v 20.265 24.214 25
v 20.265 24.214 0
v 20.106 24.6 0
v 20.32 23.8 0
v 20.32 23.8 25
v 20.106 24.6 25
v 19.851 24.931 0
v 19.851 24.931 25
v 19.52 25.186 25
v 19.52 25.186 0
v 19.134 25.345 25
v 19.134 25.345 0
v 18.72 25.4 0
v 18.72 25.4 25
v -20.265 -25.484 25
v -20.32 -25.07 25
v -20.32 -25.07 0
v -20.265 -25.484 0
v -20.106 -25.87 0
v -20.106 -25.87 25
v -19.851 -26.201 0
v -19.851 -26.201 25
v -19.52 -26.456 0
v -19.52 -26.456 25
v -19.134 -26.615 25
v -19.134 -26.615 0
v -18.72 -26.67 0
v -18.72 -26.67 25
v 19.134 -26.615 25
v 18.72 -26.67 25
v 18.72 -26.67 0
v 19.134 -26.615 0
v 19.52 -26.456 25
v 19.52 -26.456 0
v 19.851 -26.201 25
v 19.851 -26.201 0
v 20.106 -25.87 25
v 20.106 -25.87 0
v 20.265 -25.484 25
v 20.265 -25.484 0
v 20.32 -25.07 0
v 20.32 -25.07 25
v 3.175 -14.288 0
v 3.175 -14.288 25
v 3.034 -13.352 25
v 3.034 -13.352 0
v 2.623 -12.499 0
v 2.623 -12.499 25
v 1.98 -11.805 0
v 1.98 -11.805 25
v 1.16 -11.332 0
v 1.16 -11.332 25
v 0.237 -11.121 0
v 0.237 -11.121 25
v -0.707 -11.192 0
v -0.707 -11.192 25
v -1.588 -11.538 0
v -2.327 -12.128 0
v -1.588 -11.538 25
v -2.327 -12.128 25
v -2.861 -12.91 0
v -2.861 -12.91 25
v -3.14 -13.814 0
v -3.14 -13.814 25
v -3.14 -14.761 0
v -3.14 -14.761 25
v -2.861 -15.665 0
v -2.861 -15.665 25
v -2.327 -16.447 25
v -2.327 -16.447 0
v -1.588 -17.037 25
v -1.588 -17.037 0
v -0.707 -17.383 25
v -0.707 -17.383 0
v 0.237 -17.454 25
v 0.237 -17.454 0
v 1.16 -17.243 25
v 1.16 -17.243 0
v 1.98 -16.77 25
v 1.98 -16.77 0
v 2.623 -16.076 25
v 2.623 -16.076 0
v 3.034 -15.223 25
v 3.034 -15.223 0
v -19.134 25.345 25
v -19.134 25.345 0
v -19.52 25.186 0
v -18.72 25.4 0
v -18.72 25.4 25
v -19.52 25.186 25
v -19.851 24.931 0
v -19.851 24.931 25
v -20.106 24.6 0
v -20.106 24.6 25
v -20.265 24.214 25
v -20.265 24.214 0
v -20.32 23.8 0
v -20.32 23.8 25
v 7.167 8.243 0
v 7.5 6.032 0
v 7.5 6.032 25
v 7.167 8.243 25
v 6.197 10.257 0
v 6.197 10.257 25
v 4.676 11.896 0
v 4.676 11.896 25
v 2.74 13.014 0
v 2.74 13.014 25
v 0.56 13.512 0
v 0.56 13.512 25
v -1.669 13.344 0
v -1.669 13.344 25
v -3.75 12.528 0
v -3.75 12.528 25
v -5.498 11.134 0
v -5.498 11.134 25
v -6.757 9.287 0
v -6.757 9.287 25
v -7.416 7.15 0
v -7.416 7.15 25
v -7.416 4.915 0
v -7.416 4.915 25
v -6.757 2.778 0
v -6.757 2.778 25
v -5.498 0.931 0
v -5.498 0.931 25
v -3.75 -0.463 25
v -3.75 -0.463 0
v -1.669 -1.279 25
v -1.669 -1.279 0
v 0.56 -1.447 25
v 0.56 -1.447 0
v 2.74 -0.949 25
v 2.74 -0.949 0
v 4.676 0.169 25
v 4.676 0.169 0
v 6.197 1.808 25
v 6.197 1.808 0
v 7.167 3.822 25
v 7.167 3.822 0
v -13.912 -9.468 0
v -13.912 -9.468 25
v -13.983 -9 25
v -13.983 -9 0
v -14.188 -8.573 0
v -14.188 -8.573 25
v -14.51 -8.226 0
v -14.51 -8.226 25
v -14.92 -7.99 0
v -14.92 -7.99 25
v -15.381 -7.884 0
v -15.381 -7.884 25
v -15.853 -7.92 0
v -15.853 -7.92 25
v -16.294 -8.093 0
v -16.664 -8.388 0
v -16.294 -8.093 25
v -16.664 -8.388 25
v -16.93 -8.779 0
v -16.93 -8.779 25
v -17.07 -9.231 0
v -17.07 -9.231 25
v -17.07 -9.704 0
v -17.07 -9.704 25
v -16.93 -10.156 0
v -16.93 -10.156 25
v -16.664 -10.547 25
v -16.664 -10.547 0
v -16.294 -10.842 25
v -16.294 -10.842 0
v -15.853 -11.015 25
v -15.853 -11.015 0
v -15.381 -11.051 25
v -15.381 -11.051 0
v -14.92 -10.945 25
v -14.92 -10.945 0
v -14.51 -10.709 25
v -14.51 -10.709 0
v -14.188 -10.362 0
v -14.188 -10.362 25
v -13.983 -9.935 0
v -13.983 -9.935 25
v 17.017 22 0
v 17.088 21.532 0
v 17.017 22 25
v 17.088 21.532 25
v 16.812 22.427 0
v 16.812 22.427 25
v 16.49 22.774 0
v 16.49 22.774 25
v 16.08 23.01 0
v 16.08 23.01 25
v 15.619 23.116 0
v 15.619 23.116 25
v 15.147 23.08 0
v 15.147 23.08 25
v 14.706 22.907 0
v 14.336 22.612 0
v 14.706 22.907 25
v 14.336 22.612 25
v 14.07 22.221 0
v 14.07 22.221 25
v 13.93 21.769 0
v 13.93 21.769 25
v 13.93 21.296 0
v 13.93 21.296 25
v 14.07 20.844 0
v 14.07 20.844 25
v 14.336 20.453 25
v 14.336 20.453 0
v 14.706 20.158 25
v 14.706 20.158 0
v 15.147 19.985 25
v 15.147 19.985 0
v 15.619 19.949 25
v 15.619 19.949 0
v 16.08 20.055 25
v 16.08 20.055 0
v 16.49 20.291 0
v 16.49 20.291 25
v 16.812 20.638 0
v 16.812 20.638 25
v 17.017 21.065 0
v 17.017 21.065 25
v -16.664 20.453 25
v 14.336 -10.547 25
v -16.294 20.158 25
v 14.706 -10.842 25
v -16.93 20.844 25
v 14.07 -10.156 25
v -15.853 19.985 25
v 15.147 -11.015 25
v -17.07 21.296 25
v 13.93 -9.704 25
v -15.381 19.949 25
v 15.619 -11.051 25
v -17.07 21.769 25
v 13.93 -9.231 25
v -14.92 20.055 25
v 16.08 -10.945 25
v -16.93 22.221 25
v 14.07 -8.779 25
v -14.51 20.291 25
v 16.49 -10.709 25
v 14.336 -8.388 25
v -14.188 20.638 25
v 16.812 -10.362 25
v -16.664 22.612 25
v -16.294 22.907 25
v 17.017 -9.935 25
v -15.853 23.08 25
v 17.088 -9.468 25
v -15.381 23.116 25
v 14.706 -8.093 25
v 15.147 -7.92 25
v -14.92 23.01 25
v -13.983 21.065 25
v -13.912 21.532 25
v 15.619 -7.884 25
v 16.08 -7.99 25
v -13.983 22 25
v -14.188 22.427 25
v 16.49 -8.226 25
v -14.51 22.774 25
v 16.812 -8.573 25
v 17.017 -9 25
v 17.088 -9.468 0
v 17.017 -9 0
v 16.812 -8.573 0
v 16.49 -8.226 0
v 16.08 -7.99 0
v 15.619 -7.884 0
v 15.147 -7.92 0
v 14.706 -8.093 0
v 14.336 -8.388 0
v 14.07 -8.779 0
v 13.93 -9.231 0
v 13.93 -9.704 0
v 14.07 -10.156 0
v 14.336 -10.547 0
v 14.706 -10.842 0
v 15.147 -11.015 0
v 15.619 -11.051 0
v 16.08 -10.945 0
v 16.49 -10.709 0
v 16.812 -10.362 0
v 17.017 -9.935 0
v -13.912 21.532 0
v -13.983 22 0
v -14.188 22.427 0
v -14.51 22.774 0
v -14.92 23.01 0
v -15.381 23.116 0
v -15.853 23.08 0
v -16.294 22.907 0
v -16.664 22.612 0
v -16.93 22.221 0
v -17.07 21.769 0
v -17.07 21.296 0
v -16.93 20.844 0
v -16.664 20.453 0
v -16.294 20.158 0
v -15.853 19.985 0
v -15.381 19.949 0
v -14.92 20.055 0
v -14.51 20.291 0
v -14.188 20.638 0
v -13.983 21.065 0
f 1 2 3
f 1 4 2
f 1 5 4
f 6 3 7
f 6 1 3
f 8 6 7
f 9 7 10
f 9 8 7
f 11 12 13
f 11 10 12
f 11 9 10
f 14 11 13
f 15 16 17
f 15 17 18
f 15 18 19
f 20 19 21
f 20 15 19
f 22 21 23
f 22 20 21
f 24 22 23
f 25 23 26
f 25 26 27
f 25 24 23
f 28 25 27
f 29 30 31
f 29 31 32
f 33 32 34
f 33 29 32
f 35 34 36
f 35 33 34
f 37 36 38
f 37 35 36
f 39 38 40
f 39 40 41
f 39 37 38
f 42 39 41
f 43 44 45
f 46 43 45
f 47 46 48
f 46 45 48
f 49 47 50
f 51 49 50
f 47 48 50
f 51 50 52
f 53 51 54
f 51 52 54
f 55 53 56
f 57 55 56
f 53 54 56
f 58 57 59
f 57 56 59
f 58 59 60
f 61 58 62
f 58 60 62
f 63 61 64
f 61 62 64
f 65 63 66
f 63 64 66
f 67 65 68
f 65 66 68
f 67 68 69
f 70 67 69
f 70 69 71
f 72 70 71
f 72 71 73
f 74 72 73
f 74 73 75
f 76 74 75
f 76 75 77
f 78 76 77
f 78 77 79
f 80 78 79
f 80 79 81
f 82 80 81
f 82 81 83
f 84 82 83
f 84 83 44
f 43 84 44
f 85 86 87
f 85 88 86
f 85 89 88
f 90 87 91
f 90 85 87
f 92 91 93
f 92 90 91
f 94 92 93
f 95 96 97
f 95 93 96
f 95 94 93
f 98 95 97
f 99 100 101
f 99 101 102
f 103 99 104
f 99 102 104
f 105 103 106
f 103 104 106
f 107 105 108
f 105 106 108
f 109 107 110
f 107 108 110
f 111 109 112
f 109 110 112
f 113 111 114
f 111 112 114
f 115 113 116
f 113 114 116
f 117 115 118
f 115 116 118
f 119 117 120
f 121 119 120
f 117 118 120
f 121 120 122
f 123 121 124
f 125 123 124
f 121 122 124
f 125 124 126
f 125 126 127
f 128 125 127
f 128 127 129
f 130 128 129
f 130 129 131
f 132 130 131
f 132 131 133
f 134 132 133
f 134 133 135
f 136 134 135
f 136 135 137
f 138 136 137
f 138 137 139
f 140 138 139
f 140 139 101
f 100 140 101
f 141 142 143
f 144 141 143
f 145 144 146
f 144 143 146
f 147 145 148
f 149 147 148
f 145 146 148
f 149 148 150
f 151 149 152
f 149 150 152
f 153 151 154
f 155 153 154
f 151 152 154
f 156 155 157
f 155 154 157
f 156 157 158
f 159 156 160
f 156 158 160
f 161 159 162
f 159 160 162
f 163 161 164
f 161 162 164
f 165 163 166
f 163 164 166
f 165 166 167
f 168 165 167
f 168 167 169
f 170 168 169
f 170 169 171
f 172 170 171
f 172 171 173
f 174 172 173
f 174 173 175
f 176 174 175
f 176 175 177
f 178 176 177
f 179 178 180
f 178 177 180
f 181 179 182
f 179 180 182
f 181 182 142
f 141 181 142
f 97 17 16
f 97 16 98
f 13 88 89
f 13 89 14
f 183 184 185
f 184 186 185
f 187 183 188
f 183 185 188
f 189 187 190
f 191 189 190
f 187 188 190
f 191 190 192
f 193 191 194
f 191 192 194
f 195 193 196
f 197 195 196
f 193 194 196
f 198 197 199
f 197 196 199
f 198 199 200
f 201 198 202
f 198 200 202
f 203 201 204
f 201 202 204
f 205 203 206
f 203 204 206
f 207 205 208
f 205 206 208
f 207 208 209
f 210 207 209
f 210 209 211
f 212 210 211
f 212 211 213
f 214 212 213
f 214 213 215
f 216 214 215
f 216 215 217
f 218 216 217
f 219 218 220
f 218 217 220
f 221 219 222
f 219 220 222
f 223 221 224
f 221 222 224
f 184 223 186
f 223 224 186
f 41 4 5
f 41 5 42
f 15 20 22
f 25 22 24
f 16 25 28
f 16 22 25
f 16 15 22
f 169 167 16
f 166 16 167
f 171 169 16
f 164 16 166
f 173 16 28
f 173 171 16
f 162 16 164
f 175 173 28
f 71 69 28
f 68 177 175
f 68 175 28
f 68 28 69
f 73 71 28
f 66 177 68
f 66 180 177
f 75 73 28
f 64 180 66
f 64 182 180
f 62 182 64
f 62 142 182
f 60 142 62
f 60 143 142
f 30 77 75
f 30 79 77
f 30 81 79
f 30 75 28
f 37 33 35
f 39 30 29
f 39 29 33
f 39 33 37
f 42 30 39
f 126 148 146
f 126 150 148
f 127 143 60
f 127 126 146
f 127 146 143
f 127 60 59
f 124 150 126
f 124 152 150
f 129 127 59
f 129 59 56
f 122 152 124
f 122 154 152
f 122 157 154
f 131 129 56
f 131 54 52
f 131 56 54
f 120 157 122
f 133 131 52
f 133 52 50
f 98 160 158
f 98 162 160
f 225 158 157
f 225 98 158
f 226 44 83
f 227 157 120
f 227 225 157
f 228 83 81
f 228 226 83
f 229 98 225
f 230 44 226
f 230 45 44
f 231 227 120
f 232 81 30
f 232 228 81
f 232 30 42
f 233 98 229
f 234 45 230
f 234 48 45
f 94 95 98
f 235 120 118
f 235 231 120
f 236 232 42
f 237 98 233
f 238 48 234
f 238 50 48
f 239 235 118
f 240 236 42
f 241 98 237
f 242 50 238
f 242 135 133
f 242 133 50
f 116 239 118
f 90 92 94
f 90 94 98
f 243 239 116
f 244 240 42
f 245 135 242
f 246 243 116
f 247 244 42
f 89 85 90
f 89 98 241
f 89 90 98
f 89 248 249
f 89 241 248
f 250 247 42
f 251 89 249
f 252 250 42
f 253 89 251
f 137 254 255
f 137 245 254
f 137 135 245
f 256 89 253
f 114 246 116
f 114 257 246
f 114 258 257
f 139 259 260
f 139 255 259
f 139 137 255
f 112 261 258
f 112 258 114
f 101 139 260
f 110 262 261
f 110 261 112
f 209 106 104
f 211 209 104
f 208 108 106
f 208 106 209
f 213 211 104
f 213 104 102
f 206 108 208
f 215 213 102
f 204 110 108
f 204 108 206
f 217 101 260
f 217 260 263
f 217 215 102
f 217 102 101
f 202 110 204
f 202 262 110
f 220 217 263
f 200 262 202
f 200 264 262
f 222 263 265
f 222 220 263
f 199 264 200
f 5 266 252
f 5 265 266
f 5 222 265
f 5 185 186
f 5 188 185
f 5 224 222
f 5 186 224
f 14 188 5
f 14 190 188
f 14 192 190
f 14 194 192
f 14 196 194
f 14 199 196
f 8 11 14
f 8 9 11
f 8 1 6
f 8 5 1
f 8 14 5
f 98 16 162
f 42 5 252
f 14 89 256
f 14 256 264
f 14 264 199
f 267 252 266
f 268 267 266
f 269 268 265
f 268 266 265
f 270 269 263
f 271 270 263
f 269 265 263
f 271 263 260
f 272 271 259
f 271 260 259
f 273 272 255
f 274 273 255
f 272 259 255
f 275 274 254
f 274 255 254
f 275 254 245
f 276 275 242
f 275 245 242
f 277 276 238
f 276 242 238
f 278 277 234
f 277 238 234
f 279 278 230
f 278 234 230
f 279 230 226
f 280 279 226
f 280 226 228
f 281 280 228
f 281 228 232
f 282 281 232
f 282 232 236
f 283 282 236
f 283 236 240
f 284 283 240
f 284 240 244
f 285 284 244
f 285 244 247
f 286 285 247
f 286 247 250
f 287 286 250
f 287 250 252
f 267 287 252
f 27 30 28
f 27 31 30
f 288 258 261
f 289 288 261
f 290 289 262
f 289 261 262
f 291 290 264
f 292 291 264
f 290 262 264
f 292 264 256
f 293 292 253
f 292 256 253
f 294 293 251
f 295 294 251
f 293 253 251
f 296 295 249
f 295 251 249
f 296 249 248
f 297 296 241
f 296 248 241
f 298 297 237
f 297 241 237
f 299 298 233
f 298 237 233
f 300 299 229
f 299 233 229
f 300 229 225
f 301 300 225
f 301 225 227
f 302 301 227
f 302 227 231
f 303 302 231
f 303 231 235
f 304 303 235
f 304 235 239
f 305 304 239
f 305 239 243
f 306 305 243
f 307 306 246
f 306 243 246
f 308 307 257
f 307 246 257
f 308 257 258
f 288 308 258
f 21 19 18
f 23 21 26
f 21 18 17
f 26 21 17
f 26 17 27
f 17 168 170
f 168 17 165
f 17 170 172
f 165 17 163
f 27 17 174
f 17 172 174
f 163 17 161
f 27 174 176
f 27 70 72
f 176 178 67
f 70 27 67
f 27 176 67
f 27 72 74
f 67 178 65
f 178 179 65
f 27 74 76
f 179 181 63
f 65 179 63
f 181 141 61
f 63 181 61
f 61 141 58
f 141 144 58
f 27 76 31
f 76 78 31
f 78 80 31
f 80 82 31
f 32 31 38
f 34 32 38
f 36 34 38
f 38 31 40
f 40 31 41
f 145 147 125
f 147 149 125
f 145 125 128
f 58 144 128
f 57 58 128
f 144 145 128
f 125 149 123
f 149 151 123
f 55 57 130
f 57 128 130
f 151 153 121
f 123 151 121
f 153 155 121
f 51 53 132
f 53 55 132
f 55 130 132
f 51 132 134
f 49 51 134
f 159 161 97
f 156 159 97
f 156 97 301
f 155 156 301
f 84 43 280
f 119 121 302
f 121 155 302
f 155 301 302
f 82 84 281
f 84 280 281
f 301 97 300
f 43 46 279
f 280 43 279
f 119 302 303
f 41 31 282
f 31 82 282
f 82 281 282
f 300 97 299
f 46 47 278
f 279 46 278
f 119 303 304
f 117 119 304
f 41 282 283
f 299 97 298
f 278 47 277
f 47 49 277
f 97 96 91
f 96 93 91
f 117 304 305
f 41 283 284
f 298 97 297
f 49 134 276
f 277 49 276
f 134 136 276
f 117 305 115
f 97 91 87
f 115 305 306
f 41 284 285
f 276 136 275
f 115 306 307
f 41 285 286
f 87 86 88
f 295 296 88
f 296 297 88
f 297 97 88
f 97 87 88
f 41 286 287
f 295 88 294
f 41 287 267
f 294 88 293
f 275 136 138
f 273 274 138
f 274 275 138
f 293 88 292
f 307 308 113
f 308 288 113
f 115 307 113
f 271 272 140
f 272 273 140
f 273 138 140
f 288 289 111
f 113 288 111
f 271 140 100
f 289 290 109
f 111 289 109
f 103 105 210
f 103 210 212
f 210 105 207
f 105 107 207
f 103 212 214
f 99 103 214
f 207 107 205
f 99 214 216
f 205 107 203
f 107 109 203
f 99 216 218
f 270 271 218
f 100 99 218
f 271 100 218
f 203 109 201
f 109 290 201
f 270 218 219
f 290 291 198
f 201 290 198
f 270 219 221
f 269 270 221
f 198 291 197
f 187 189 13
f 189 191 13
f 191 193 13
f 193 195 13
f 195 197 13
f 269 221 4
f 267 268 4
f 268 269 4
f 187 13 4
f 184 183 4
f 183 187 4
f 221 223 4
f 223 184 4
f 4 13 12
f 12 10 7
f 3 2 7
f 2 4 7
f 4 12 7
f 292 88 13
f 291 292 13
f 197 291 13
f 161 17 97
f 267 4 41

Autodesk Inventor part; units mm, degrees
ref_plane "YZ Plane" through (0, 0, 0) normal (1, 0, 0) x (0, 1, 0)
ref_plane "XZ Plane" through (0, 0, 0) normal (0, 1, 0) x (-1, 0, 0)
ref_plane "XY Plane" through (0, 0, 0) normal (0, 0, 1) x (1, 0, 0)
sketch "Sketch1" plane through (0, 0, 0) normal (0, 0, 1) x (1, 0, 0)
  line L0 (-20.32, 26.67) -> (20.32, 26.67)
  line L1 (20.32, 26.67) -> (20.32, -26.67)
  line L2 (20.32, -26.67) -> (-20.32, -26.67)
  line L3 (-20.32, -26.67) -> (-20.32, 26.67)
  point P0 (0, 0)
  point P1 (20.32, 0)
  point P2 (0, 26.67)
  dimension "d0" = 40.64
  dimension "d1" = 53.34
extrude "Extrusion1" add sketch "Sketch1" along normal blind 25
sketch "Sketch2" plane through (0, 0, 25) normal (0, 0, 1) x (1, 0, 0)
  circle A0 centre (0, 6.0325) radius 7.5
  line L0 (20.32, 26.67) -> (-20.32, 26.67) projected
  circle A1 centre (0, -14.2875) radius 3.175
  line L1 (0, 6.0325) -> (44.8131, 6.0325) construction
  line L2 (0, 6.0325) -> (0, 52.3228) construction
  circle A2 centre (15.5, 21.5325) radius 1.5875
  circle A3 centre (-15.5, 21.5325) radius 1.5875
  circle A4 centre (15.5, -9.4675) radius 1.5875
  circle A5 centre (-15.5, -9.4675) radius 1.5875
  point P0 (0, 0)
  dimension "d4" = 20.6375
  dimension "d5" = 15
  dimension "d8" = 6.35
  dimension "d9" = 20.32
  dimension "d11" = 3.175
  dimension "d12" = 15.5
  dimension "d13" = 15.5
extrude "Extrusion2" cut sketch "Sketch2" against normal up to surface (25 mm away)
sketch "Sketch3" plane through (-20.32, 26.67, 0) normal (0, 1, 0) x (1, 0, 0)
  line L0 (0, 0) -> (0, -25) projected
  line L1 (0, -25) -> (40.64, -25) projected
  line L2 (0, 0) -> (40.64, 0)
  line L3 (40.64, 0) -> (40.64, -25)
  line L4 (40.64, -25) -> (0, -25)
  line L5 (0, -25) -> (0, 0)
  point P0 (20.32, 0)
extrude "Extrusion3" cut sketch "Sketch3" against normal blind 1.27
fillet "Fillet1" radius 1.6002 4 edges at (20.32, 25.4, 12.5) (-20.32, 25.4, 12.5) (20.32, -26.67, 12.5) (-20.32, -26.67, 12.5)
properties part number "Motor Brace"
